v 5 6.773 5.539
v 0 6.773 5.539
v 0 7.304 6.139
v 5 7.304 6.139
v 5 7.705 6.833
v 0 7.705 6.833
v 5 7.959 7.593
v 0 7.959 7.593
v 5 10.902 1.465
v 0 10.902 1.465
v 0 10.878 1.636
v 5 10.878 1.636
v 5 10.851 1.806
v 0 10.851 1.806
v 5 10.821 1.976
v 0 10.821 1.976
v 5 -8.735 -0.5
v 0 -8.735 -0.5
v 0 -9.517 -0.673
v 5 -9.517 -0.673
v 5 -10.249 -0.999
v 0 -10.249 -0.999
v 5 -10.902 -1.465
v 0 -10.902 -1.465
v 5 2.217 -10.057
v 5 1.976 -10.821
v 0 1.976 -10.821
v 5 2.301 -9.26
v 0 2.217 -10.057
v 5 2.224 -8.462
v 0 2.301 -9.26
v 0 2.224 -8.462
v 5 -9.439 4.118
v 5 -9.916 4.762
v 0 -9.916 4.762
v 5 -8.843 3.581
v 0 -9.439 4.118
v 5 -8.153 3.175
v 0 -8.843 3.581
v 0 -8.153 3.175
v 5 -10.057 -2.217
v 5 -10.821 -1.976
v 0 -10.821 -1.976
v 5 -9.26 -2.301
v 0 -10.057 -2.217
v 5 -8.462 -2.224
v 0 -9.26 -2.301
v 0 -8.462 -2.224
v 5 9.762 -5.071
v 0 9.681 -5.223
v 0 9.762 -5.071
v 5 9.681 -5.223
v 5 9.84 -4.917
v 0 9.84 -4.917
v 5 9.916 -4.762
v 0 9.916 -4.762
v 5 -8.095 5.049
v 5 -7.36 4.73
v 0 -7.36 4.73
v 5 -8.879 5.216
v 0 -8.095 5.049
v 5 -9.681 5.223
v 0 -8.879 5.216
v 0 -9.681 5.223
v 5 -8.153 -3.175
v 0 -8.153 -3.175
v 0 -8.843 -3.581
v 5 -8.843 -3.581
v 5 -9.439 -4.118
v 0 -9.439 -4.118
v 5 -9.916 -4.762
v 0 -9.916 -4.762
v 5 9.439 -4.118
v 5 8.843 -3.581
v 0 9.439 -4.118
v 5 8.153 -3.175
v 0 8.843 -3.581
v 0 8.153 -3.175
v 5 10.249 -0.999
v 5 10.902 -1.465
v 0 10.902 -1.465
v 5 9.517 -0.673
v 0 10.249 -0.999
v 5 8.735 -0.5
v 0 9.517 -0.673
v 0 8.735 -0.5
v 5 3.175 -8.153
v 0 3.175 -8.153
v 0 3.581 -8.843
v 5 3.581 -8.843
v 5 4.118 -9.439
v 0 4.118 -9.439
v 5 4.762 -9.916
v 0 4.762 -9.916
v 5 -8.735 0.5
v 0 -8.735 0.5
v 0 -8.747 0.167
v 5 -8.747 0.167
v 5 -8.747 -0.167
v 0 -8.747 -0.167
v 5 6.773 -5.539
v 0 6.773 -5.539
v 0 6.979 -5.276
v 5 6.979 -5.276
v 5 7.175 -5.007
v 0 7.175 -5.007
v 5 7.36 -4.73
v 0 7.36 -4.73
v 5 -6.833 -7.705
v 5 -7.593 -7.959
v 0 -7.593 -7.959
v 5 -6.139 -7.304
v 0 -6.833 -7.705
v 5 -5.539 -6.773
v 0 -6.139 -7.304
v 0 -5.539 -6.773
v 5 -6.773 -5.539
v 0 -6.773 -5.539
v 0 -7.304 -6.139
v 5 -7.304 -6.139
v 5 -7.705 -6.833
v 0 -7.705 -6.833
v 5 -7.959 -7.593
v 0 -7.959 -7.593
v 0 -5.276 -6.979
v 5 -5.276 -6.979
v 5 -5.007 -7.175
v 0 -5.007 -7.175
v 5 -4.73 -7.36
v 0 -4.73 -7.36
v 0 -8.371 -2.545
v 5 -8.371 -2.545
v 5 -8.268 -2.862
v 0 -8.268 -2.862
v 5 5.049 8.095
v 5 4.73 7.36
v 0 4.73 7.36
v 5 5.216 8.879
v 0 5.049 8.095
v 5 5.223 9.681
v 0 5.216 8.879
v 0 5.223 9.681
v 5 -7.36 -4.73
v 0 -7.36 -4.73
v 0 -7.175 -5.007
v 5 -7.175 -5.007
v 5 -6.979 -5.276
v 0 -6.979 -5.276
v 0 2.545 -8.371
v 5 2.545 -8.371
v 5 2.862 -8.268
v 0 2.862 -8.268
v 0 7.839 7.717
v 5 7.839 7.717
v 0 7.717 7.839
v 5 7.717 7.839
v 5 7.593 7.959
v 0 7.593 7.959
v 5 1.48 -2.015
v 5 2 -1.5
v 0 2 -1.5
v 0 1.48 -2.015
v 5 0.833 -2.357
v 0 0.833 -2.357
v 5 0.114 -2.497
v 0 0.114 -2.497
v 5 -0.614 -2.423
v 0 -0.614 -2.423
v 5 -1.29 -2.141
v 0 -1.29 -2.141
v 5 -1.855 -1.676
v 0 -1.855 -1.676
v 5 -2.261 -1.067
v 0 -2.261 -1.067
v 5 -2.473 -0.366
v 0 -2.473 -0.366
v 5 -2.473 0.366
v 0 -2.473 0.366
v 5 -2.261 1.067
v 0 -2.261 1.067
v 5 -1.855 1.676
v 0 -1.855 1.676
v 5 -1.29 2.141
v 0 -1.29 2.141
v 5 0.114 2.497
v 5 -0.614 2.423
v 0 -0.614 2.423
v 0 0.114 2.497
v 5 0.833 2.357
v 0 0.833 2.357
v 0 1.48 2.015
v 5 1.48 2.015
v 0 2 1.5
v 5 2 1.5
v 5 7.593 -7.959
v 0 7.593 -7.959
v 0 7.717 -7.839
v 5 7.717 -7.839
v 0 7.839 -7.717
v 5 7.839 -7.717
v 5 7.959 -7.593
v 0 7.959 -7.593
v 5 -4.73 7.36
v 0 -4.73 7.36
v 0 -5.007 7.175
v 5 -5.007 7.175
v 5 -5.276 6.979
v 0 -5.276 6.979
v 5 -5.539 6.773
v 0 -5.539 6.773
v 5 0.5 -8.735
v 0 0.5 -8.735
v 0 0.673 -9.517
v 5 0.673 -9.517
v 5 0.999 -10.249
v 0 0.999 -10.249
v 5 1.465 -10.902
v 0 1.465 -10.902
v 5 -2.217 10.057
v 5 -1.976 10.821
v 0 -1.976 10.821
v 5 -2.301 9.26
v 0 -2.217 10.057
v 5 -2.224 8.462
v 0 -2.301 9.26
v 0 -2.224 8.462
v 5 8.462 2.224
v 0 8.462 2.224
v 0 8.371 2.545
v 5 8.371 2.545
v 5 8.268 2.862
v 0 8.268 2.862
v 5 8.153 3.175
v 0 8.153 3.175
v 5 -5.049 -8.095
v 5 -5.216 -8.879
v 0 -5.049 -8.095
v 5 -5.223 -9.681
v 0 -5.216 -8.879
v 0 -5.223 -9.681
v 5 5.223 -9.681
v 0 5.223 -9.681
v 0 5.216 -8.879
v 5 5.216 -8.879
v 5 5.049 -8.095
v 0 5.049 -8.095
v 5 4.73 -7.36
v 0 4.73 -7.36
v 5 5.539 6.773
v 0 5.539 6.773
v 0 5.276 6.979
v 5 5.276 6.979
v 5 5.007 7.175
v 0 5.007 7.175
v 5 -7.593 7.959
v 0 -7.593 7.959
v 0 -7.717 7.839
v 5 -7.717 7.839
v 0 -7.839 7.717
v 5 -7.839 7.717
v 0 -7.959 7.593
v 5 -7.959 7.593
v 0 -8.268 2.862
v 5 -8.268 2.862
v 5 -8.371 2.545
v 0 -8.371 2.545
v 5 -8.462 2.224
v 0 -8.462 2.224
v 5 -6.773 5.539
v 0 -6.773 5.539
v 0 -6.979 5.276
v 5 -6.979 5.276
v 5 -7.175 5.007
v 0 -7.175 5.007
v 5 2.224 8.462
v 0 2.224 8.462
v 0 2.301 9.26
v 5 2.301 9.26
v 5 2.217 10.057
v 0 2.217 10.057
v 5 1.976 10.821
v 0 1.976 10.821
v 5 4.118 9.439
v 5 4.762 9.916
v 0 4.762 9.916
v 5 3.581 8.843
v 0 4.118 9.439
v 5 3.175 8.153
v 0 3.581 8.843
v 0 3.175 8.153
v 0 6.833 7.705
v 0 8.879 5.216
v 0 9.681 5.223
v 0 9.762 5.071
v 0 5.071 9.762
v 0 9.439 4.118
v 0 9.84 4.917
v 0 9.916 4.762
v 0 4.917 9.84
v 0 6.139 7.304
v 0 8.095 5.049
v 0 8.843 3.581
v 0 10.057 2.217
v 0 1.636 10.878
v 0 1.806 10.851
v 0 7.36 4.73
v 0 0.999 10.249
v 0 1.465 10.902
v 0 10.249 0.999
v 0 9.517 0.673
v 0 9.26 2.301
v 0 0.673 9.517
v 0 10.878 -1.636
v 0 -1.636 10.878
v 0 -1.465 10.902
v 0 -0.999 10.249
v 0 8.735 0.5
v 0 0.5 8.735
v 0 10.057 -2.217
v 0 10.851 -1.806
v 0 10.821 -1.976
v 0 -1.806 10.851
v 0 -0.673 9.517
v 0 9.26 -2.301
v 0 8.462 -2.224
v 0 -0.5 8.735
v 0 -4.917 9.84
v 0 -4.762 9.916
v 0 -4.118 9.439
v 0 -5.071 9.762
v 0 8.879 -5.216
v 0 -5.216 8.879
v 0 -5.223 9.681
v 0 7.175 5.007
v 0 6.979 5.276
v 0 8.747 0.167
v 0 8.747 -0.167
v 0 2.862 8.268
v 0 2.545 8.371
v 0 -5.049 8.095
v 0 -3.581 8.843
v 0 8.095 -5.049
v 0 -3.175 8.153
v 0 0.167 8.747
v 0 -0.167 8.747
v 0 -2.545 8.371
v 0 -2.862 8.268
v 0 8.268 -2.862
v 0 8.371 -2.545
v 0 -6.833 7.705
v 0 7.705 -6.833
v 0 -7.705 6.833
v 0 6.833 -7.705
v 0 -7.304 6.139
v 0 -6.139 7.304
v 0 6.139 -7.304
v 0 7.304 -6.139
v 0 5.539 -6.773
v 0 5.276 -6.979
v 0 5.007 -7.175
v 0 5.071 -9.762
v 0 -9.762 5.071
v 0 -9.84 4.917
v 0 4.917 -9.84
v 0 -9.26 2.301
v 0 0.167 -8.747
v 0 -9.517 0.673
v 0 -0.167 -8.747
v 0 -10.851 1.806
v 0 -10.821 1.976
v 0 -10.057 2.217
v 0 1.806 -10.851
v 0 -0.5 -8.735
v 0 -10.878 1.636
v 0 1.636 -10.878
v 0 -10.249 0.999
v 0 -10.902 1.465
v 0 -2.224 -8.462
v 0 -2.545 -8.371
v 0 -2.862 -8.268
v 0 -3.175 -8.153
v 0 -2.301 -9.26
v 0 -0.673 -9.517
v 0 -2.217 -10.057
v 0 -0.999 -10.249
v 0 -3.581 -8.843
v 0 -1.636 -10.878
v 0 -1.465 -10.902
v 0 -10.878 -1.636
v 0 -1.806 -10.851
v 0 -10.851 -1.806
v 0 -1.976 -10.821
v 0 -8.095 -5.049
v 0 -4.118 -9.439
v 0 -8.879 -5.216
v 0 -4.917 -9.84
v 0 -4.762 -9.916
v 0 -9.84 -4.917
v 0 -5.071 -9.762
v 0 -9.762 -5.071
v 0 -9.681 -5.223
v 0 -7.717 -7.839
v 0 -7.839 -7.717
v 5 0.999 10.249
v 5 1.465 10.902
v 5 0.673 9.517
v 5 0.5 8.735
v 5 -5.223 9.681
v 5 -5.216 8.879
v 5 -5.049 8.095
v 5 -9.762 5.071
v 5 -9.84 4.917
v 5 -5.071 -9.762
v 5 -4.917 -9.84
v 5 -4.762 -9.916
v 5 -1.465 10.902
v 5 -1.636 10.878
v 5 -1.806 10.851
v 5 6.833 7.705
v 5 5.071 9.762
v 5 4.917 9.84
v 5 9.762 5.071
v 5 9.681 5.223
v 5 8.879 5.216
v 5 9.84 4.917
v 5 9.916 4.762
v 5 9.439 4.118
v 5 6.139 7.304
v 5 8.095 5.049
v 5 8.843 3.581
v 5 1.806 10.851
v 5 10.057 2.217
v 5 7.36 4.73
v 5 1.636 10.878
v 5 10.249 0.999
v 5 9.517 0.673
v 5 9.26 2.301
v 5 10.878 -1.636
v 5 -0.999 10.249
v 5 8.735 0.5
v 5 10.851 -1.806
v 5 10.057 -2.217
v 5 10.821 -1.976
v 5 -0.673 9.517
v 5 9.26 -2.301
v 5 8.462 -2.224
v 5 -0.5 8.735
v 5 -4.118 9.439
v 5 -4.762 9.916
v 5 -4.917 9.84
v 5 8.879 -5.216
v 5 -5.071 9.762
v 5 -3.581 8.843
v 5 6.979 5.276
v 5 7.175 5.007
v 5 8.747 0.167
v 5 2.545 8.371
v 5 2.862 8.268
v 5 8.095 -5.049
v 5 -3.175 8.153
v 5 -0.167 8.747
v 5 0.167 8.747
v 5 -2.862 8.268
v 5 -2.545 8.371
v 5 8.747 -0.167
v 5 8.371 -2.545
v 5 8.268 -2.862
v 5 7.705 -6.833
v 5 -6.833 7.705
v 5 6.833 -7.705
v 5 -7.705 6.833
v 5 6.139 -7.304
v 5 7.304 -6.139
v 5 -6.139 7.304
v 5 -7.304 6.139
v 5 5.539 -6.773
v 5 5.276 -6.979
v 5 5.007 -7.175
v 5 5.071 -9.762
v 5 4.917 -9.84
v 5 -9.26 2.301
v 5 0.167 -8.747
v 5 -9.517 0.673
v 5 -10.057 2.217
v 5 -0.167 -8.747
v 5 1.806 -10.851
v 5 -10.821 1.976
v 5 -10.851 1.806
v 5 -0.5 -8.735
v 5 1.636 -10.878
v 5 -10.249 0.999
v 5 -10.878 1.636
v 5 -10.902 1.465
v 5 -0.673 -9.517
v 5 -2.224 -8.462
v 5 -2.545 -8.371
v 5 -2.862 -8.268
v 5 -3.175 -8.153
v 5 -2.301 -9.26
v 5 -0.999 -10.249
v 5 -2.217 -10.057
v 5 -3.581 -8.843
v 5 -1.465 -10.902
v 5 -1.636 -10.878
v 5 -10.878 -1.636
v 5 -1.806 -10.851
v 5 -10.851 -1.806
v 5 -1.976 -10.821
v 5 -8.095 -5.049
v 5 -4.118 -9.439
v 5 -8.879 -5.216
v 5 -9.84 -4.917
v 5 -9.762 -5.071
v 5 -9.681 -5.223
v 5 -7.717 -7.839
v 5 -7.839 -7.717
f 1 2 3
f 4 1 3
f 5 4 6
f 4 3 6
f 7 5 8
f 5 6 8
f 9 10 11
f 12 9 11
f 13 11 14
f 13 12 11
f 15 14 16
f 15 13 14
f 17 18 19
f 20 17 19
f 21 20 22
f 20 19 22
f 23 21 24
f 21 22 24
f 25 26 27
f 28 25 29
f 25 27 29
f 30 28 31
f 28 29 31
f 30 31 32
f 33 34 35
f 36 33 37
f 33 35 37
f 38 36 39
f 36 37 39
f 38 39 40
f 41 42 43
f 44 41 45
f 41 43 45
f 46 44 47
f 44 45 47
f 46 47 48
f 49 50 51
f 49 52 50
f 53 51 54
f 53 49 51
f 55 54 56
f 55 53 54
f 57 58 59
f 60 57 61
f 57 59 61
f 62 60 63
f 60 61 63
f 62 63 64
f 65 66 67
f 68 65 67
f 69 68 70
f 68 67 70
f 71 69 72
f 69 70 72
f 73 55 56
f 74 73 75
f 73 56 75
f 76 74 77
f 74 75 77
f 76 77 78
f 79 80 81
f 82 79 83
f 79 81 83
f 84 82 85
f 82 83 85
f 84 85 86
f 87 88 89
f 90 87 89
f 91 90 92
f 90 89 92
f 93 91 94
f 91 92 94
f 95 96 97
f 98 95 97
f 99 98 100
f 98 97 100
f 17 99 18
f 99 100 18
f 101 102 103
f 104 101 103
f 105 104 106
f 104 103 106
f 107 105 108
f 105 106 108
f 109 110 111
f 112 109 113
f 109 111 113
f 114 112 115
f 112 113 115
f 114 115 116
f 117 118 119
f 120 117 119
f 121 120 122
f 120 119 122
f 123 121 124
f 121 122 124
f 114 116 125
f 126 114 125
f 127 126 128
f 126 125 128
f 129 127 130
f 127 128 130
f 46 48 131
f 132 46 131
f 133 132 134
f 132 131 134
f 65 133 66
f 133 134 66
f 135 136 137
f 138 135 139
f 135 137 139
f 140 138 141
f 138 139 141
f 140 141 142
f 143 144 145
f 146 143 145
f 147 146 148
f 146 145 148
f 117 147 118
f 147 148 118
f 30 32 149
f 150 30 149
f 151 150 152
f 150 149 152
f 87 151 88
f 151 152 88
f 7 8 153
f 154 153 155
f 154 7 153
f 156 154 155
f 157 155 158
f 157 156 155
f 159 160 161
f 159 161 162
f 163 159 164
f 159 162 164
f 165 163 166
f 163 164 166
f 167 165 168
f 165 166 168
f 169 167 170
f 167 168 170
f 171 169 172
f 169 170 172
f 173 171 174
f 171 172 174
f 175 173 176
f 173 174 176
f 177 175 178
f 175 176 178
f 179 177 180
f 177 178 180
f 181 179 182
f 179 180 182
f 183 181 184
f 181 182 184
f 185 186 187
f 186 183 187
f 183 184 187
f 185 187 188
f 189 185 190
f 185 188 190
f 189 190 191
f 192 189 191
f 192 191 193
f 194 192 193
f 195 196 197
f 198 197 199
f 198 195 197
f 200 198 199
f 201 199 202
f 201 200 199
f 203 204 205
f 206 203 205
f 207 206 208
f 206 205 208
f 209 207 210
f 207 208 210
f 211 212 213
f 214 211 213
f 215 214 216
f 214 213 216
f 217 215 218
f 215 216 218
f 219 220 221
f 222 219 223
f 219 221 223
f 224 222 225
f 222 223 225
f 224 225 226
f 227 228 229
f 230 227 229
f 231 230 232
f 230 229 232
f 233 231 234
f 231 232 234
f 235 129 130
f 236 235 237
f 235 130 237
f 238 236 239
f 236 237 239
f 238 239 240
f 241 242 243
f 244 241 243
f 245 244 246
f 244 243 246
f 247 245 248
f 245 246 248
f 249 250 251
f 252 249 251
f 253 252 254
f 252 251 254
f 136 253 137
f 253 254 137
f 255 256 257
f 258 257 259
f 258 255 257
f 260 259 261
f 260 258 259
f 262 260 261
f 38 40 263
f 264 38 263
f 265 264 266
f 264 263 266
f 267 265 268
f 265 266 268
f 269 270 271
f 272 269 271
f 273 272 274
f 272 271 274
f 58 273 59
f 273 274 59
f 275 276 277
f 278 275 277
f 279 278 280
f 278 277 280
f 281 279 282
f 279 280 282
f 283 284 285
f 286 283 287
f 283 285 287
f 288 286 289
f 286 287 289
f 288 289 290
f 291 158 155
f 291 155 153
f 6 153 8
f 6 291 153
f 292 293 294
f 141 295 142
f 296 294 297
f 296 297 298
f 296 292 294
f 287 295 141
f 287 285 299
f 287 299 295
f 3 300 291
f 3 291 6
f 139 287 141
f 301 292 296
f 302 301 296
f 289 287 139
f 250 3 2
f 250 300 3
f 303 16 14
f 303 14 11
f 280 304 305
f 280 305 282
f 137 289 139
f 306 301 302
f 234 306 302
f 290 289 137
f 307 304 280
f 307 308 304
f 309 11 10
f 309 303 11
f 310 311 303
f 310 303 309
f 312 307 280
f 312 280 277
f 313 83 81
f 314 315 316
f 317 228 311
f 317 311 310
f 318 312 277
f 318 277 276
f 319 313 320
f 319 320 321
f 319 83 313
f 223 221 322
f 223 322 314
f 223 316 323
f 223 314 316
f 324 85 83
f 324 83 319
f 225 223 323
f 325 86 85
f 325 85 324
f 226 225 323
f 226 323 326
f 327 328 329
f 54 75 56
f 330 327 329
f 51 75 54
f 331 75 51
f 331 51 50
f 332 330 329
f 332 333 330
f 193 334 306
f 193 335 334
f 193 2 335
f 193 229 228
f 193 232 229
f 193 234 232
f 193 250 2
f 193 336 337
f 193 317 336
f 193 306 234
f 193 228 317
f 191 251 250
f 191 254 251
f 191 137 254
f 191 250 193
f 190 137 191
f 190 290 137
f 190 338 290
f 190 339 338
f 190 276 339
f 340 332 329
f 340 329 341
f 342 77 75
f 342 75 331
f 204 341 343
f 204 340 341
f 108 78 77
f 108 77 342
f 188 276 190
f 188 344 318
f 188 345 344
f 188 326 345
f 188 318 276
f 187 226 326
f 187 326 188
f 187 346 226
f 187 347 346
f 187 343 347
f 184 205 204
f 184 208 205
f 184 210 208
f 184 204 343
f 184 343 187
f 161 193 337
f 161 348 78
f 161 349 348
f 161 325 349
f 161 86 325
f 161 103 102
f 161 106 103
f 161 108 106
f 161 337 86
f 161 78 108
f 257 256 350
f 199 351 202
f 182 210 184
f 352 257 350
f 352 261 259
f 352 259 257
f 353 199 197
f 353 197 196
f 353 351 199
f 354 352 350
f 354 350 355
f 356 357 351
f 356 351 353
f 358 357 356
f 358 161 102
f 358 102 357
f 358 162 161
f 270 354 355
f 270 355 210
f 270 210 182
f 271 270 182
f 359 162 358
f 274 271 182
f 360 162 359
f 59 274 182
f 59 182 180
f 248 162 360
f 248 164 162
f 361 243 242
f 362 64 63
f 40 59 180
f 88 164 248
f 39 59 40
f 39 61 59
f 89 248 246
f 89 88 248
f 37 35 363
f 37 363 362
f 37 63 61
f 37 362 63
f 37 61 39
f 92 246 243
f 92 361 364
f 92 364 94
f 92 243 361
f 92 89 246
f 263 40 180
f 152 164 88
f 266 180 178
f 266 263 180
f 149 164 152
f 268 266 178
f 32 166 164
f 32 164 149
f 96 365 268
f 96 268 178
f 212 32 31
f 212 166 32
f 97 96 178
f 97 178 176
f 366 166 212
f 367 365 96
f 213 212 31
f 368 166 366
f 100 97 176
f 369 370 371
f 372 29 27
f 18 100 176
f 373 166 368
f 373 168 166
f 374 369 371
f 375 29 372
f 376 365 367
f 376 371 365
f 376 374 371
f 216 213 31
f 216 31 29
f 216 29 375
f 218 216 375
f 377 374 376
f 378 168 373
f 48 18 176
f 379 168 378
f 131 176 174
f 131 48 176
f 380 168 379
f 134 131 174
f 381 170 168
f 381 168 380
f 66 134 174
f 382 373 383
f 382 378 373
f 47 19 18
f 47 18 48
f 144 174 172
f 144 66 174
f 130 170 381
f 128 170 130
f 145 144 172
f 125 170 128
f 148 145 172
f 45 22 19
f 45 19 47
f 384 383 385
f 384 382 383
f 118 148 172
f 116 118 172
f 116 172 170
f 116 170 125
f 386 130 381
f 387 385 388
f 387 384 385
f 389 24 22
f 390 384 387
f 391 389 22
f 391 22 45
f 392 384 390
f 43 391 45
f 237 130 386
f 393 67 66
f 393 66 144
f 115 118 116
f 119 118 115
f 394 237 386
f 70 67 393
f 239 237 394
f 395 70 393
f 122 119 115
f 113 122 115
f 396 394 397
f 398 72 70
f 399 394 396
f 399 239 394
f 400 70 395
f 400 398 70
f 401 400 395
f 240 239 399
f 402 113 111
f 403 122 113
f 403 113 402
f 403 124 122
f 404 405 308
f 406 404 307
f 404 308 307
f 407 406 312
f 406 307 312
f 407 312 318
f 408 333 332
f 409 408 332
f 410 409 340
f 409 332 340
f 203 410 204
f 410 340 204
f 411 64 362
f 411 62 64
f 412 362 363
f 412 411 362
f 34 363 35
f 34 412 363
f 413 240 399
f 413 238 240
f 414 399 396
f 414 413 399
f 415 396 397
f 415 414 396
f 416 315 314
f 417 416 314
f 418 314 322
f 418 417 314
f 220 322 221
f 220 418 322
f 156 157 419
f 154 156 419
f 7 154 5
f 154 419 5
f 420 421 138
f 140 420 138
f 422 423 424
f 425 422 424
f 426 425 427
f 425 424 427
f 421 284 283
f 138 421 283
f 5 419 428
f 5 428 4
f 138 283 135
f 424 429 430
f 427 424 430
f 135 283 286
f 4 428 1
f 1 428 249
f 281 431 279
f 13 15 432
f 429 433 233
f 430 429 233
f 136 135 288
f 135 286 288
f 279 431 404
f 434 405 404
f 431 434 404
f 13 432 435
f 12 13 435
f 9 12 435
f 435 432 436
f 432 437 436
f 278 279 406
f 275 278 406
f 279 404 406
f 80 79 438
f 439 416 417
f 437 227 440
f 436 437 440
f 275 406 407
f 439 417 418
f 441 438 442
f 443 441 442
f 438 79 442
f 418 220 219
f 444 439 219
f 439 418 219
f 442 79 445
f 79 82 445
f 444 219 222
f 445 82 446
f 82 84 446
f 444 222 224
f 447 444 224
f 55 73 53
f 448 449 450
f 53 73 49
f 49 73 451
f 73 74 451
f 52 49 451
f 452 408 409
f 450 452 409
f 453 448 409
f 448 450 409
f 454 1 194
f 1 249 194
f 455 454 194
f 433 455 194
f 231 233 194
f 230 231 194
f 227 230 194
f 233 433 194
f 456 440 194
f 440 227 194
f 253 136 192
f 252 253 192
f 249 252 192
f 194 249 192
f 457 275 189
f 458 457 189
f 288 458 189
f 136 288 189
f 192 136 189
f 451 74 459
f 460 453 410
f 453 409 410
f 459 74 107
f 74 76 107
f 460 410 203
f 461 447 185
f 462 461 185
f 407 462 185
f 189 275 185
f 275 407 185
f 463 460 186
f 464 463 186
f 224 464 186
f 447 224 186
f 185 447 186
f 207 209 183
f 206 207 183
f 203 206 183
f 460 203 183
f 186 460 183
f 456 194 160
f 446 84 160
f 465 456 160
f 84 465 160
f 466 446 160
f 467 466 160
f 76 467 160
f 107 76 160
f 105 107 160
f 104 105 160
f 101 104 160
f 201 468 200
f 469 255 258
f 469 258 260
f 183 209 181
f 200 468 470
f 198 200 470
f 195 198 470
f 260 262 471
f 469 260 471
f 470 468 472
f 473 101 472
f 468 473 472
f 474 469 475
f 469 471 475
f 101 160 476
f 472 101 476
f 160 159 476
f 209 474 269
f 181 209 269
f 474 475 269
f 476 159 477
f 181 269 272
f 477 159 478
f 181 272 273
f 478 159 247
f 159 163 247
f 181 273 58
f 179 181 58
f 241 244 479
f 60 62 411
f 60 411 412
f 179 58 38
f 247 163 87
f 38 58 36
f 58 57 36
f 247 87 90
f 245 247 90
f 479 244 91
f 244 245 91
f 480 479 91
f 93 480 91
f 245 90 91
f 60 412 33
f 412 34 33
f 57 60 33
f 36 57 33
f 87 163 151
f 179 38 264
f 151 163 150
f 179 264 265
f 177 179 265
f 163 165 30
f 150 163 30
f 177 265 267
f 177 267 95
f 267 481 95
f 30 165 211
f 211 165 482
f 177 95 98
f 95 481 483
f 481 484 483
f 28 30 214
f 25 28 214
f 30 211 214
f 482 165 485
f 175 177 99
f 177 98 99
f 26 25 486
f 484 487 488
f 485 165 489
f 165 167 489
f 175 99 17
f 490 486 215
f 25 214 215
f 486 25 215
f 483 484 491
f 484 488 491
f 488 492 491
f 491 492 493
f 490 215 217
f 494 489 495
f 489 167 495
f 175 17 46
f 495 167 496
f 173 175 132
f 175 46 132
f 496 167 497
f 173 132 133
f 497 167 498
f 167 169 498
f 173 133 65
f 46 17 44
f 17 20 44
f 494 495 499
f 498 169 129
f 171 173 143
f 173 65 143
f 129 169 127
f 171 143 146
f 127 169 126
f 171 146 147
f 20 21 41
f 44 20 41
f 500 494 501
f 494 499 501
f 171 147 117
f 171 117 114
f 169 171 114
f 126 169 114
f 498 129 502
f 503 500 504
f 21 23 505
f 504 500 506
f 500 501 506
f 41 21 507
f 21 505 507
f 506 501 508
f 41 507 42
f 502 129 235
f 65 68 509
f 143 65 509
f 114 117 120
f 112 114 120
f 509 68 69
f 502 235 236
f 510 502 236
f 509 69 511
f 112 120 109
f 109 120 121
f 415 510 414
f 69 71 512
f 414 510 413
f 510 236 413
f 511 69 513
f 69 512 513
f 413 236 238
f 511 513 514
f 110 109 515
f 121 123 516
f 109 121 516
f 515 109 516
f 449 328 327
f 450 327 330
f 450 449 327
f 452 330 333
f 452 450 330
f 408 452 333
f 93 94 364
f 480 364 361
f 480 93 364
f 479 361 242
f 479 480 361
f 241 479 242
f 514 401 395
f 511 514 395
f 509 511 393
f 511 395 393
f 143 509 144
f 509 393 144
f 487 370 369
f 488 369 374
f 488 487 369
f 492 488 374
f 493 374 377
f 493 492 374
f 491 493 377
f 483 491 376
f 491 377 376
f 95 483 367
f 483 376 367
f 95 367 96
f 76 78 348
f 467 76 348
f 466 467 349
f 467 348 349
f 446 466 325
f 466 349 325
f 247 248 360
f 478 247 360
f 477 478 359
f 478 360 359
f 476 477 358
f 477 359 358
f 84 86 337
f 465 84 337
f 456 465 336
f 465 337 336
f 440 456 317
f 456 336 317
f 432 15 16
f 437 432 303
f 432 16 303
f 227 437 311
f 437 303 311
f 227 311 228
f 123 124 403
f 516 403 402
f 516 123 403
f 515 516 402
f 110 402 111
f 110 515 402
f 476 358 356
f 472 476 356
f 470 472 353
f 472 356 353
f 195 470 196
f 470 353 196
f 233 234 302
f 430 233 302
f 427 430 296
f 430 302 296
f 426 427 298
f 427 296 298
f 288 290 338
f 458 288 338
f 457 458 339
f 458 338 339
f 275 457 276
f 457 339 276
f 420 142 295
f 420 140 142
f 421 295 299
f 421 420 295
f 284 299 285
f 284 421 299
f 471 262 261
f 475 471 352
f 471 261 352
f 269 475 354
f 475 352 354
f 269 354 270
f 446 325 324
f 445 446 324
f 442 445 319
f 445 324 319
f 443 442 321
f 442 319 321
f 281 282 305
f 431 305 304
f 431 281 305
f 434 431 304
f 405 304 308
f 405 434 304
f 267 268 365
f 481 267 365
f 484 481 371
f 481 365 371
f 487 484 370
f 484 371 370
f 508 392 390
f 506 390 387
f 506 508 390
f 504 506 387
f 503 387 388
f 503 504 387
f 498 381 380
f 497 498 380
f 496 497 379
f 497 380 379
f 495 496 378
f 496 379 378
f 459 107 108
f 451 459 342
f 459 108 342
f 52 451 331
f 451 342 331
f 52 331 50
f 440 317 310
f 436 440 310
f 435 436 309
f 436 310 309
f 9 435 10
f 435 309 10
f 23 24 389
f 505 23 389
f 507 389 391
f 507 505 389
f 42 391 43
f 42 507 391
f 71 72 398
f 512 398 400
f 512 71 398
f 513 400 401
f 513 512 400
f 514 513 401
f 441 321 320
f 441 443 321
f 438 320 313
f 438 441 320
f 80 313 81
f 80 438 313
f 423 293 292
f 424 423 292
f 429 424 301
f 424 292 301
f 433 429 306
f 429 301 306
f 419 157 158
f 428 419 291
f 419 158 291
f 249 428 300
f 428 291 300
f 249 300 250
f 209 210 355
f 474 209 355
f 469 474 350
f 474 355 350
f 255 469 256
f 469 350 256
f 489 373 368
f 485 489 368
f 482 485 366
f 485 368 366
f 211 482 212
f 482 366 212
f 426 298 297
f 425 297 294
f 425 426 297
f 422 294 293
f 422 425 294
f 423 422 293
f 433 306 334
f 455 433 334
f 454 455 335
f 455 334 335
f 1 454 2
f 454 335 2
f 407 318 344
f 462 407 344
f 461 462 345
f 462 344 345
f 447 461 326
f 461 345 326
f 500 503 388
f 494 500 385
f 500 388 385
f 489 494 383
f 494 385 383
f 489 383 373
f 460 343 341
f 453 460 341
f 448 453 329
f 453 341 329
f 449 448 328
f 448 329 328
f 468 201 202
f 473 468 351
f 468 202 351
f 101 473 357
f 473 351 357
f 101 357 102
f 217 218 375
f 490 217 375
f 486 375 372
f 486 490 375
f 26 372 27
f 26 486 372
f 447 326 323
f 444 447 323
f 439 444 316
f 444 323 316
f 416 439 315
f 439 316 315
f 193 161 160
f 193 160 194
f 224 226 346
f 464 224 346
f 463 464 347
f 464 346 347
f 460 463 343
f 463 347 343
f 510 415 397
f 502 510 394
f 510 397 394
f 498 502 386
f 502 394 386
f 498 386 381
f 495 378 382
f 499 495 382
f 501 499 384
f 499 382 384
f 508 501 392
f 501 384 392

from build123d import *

# Parameters (mm, degrees)
BASPROSKE_W         = 5
BASPROSKE_H         = 11
TOOTHCUT_DEPTH      = 17.340134638
TEETHCUTS_COUNT     = 20
TEETHCUTS_ANGLE     = 342
BORSKE_R            = 1.5
BORE_DEPTH          = 50.0000508
SKETCH1_R           = 2.5
CUT_EXTRUDE1_DEPTH  = 10
SKETCH2_W           = 5.908261021
SKETCH2_H           = 1.397592127
BOSS_EXTRUDE1_DEPTH = 5
SKETCH3_R           = 2.5
CUT_EXTRUDE2_DEPTH  = 10
SKETCH4_W           = 5.744521792
SKETCH4_H           = 0.916677302
BOSS_EXTRUDE2_DEPTH = 5


with BuildPart() as part:
    # BasProSke → Base-Revolve (revolve)
    with BuildSketch(Plane(origin=(0, 0, 0), x_dir=(1, 0, 0), z_dir=(0, 1, 0)), mode=Mode.PRIVATE) as base_revolve_sk:
        with Locations((2.5, 5.5)):
            Rectangle(BASPROSKE_W, BASPROSKE_H)
    revolve(base_revolve_sk.sketch.rotate(Axis((-10, 0, 0), (1, 0, 0)), 180), axis=Axis((-10, 0, 0), (1, 0, 0)))

    # TooCutSke → ToothCut (cut, through all)
    with BuildSketch(Plane(origin=(0, 0, 0), x_dir=(0, 0, -1), z_dir=(1, 0, 0))):
        with BuildLine():
            ThreePointArc((0.499924007, 8.734705318), (0, 8.749), (-0.499924007, 8.734705318))
            ThreePointArc((-0.499924007, 8.734705318), (-0.824302243, 9.905497836), (-1.485192705, 10.924909509))
            ThreePointArc((-1.485192705, 10.924909509), (0, 11.0254), (1.485192705, 10.924909509))
            ThreePointArc((1.485192705, 10.924909509), (0.824302243, 9.905497836), (0.499924007, 8.734705318))
        make_face()
    toothcut = extrude(amount=TOOTHCUT_DEPTH, mode=Mode.SUBTRACT)

    # TeethCuts: ToothCut ×20 about axis
    teethcuts_axis = Axis((-10, 0, 0), (1, 0, 0))
    for i in range(1, TEETHCUTS_COUNT):
        add(toothcut.rotate(teethcuts_axis, i * TEETHCUTS_ANGLE / (TEETHCUTS_COUNT - 1)), mode=Mode.SUBTRACT)

    # BorSke → Bore (cut, symmetric)
    with BuildSketch(Plane(origin=(0, 0, 0), x_dir=(0, 0, -1), z_dir=(1, 0, 0))):
        with Locations(Location((0, 0, 0), (0, 0, 180))):
            Circle(BORSKE_R)
    extrude(amount=BORE_DEPTH, both=True, mode=Mode.SUBTRACT)

    # Sketch1 → Cut-Extrude1 (cut)
    with BuildSketch(Plane(origin=(5, 0, 0), x_dir=(0, 0, -1), z_dir=(1, 0, 0))):
        Circle(SKETCH1_R)
    extrude(amount=-CUT_EXTRUDE1_DEPTH, mode=Mode.SUBTRACT)

    # Sketch2 → Boss-Extrude1 (add)
    with BuildSketch(Plane(origin=(5, 0, 0), x_dir=(0, 0, -1), z_dir=(1, 0, 0))):
        with Locations((-0.183749745, 2.198796064)):
            Rectangle(SKETCH2_W, SKETCH2_H)
    extrude(amount=-BOSS_EXTRUDE1_DEPTH)

    # Sketch3 → Cut-Extrude2 (cut)
    with BuildSketch(Plane.ZY):
        with Locations(Location((0, 0, 0), (0, 0, 180))):
            Circle(SKETCH3_R)
    extrude(amount=-CUT_EXTRUDE2_DEPTH, mode=Mode.SUBTRACT)

    # Sketch4 → Boss-Extrude2 (add, through all)
    with BuildSketch(Plane.ZY):
        with Locations((0.562607804, 2.458338651)):
            Rectangle(SKETCH4_W, SKETCH4_H)
    extrude(amount=-BOSS_EXTRUDE2_DEPTH)


solid = part.part
